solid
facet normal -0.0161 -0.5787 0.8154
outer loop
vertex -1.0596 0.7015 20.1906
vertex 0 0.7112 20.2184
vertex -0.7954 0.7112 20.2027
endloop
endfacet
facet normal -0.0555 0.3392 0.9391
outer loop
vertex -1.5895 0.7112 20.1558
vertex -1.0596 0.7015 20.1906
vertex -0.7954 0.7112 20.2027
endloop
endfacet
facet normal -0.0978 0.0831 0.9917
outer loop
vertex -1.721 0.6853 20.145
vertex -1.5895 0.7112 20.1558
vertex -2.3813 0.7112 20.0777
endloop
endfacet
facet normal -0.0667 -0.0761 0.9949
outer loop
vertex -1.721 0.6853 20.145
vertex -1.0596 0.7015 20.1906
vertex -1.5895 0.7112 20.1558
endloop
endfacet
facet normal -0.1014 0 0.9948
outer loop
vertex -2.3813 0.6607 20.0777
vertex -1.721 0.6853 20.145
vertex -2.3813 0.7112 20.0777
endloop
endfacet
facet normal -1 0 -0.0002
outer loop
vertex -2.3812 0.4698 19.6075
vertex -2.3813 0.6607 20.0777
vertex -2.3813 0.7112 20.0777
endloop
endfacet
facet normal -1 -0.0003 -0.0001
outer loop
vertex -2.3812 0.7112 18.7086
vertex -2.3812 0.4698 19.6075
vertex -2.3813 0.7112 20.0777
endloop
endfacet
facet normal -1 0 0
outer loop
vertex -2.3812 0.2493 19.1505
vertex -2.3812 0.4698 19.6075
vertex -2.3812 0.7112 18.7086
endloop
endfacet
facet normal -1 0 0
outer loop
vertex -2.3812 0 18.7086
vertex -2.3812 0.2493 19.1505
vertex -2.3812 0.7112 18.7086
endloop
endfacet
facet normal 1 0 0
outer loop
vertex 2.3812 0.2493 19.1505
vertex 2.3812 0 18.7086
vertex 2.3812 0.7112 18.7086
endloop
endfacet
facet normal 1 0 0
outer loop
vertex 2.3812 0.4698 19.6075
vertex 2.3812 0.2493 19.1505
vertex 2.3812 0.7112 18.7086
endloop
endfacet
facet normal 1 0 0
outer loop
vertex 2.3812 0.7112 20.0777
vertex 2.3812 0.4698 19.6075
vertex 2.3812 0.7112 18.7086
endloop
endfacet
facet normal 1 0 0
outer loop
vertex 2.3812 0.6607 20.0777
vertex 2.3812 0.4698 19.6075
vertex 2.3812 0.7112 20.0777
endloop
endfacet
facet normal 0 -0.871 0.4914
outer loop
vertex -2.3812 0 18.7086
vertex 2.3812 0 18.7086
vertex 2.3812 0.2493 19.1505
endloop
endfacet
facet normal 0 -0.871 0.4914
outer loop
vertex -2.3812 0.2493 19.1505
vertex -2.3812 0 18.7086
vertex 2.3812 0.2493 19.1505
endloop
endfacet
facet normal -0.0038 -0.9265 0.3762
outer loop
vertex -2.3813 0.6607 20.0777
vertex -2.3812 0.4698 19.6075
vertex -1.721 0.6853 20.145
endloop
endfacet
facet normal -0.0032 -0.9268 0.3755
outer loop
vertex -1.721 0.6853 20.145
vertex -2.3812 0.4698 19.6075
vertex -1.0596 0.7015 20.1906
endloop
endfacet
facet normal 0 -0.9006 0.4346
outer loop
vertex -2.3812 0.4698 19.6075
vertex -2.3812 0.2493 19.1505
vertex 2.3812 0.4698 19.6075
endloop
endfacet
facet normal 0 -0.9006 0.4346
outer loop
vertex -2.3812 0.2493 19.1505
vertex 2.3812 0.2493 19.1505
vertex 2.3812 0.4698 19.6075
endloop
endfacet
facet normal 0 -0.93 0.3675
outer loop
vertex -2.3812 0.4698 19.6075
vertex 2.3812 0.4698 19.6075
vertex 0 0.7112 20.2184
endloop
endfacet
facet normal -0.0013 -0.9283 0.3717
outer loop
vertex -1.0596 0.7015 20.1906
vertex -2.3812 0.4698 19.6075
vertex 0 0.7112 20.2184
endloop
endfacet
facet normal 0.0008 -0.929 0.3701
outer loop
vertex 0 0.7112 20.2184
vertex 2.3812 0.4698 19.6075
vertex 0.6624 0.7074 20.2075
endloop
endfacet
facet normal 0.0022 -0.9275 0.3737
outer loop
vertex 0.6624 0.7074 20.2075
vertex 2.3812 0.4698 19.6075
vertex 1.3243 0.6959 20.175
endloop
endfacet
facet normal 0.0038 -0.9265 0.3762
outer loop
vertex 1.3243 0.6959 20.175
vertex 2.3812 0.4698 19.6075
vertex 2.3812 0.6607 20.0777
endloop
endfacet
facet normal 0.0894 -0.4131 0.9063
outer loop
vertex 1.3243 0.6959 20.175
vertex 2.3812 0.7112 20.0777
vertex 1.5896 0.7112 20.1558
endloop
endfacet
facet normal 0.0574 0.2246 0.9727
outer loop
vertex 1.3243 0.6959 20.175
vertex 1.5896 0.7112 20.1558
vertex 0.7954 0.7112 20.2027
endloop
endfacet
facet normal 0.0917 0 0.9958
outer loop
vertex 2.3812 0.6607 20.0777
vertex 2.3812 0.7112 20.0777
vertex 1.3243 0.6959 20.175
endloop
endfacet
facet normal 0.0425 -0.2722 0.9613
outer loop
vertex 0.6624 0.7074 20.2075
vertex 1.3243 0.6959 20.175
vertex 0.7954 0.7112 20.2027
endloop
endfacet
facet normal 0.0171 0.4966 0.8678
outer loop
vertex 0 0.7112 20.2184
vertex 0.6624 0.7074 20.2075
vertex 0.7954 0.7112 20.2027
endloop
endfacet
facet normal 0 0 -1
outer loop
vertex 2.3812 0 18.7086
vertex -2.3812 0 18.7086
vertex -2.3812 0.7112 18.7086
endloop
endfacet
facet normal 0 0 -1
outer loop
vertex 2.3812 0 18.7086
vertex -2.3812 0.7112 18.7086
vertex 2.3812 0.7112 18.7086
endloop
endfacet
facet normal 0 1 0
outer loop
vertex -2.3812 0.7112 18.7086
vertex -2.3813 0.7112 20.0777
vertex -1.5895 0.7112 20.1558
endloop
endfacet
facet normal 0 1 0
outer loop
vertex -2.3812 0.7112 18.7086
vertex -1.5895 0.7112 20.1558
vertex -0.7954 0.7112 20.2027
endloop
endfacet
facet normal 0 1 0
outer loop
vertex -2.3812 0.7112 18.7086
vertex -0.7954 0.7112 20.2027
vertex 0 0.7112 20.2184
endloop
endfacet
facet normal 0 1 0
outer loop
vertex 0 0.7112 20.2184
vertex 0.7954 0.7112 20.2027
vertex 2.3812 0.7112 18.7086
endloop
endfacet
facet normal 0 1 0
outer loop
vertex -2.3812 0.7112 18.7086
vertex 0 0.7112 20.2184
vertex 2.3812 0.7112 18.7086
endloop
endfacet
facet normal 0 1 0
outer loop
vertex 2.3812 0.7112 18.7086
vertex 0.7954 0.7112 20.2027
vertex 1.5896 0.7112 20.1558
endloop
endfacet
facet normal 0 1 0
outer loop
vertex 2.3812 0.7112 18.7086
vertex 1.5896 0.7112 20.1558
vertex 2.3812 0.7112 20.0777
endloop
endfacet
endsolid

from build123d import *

# Parameters (mm, degrees)
F1_DEPTH = 0.7112
F2_R     = 7.9375
F3_DEPTH = 2.38125


with BuildPart() as f1:
    # F0 (on Front) → F1 (new body)
    with BuildSketch(Plane.XZ):
        with BuildLine():
            Line((2.38125, 18.7085645812), (2.38125, 20.0776828095))
            ThreePointArc((2.38125, 20.0776828095), (0, 20.2184), (-2.38125, 20.0776828095))
            Line((-2.38125, 20.0776828095), (-2.38125, 18.7085645812))
            Line((-2.38125, 18.7085645812), (0, 18.7085645812))
            Line((0, 18.7085645812), (2.38125, 18.7085645812))
        make_face()
    extrude(amount=-F1_DEPTH)

    # F2 (on Right) → F3 (cut, symmetric)
    with BuildSketch(Plane.YZ):
        with Locations((-6.7853422018, 22.8271854006)):
            Circle(F2_R)
    extrude(amount=F3_DEPTH, both=True, mode=Mode.SUBTRACT)


solid = f1.part
